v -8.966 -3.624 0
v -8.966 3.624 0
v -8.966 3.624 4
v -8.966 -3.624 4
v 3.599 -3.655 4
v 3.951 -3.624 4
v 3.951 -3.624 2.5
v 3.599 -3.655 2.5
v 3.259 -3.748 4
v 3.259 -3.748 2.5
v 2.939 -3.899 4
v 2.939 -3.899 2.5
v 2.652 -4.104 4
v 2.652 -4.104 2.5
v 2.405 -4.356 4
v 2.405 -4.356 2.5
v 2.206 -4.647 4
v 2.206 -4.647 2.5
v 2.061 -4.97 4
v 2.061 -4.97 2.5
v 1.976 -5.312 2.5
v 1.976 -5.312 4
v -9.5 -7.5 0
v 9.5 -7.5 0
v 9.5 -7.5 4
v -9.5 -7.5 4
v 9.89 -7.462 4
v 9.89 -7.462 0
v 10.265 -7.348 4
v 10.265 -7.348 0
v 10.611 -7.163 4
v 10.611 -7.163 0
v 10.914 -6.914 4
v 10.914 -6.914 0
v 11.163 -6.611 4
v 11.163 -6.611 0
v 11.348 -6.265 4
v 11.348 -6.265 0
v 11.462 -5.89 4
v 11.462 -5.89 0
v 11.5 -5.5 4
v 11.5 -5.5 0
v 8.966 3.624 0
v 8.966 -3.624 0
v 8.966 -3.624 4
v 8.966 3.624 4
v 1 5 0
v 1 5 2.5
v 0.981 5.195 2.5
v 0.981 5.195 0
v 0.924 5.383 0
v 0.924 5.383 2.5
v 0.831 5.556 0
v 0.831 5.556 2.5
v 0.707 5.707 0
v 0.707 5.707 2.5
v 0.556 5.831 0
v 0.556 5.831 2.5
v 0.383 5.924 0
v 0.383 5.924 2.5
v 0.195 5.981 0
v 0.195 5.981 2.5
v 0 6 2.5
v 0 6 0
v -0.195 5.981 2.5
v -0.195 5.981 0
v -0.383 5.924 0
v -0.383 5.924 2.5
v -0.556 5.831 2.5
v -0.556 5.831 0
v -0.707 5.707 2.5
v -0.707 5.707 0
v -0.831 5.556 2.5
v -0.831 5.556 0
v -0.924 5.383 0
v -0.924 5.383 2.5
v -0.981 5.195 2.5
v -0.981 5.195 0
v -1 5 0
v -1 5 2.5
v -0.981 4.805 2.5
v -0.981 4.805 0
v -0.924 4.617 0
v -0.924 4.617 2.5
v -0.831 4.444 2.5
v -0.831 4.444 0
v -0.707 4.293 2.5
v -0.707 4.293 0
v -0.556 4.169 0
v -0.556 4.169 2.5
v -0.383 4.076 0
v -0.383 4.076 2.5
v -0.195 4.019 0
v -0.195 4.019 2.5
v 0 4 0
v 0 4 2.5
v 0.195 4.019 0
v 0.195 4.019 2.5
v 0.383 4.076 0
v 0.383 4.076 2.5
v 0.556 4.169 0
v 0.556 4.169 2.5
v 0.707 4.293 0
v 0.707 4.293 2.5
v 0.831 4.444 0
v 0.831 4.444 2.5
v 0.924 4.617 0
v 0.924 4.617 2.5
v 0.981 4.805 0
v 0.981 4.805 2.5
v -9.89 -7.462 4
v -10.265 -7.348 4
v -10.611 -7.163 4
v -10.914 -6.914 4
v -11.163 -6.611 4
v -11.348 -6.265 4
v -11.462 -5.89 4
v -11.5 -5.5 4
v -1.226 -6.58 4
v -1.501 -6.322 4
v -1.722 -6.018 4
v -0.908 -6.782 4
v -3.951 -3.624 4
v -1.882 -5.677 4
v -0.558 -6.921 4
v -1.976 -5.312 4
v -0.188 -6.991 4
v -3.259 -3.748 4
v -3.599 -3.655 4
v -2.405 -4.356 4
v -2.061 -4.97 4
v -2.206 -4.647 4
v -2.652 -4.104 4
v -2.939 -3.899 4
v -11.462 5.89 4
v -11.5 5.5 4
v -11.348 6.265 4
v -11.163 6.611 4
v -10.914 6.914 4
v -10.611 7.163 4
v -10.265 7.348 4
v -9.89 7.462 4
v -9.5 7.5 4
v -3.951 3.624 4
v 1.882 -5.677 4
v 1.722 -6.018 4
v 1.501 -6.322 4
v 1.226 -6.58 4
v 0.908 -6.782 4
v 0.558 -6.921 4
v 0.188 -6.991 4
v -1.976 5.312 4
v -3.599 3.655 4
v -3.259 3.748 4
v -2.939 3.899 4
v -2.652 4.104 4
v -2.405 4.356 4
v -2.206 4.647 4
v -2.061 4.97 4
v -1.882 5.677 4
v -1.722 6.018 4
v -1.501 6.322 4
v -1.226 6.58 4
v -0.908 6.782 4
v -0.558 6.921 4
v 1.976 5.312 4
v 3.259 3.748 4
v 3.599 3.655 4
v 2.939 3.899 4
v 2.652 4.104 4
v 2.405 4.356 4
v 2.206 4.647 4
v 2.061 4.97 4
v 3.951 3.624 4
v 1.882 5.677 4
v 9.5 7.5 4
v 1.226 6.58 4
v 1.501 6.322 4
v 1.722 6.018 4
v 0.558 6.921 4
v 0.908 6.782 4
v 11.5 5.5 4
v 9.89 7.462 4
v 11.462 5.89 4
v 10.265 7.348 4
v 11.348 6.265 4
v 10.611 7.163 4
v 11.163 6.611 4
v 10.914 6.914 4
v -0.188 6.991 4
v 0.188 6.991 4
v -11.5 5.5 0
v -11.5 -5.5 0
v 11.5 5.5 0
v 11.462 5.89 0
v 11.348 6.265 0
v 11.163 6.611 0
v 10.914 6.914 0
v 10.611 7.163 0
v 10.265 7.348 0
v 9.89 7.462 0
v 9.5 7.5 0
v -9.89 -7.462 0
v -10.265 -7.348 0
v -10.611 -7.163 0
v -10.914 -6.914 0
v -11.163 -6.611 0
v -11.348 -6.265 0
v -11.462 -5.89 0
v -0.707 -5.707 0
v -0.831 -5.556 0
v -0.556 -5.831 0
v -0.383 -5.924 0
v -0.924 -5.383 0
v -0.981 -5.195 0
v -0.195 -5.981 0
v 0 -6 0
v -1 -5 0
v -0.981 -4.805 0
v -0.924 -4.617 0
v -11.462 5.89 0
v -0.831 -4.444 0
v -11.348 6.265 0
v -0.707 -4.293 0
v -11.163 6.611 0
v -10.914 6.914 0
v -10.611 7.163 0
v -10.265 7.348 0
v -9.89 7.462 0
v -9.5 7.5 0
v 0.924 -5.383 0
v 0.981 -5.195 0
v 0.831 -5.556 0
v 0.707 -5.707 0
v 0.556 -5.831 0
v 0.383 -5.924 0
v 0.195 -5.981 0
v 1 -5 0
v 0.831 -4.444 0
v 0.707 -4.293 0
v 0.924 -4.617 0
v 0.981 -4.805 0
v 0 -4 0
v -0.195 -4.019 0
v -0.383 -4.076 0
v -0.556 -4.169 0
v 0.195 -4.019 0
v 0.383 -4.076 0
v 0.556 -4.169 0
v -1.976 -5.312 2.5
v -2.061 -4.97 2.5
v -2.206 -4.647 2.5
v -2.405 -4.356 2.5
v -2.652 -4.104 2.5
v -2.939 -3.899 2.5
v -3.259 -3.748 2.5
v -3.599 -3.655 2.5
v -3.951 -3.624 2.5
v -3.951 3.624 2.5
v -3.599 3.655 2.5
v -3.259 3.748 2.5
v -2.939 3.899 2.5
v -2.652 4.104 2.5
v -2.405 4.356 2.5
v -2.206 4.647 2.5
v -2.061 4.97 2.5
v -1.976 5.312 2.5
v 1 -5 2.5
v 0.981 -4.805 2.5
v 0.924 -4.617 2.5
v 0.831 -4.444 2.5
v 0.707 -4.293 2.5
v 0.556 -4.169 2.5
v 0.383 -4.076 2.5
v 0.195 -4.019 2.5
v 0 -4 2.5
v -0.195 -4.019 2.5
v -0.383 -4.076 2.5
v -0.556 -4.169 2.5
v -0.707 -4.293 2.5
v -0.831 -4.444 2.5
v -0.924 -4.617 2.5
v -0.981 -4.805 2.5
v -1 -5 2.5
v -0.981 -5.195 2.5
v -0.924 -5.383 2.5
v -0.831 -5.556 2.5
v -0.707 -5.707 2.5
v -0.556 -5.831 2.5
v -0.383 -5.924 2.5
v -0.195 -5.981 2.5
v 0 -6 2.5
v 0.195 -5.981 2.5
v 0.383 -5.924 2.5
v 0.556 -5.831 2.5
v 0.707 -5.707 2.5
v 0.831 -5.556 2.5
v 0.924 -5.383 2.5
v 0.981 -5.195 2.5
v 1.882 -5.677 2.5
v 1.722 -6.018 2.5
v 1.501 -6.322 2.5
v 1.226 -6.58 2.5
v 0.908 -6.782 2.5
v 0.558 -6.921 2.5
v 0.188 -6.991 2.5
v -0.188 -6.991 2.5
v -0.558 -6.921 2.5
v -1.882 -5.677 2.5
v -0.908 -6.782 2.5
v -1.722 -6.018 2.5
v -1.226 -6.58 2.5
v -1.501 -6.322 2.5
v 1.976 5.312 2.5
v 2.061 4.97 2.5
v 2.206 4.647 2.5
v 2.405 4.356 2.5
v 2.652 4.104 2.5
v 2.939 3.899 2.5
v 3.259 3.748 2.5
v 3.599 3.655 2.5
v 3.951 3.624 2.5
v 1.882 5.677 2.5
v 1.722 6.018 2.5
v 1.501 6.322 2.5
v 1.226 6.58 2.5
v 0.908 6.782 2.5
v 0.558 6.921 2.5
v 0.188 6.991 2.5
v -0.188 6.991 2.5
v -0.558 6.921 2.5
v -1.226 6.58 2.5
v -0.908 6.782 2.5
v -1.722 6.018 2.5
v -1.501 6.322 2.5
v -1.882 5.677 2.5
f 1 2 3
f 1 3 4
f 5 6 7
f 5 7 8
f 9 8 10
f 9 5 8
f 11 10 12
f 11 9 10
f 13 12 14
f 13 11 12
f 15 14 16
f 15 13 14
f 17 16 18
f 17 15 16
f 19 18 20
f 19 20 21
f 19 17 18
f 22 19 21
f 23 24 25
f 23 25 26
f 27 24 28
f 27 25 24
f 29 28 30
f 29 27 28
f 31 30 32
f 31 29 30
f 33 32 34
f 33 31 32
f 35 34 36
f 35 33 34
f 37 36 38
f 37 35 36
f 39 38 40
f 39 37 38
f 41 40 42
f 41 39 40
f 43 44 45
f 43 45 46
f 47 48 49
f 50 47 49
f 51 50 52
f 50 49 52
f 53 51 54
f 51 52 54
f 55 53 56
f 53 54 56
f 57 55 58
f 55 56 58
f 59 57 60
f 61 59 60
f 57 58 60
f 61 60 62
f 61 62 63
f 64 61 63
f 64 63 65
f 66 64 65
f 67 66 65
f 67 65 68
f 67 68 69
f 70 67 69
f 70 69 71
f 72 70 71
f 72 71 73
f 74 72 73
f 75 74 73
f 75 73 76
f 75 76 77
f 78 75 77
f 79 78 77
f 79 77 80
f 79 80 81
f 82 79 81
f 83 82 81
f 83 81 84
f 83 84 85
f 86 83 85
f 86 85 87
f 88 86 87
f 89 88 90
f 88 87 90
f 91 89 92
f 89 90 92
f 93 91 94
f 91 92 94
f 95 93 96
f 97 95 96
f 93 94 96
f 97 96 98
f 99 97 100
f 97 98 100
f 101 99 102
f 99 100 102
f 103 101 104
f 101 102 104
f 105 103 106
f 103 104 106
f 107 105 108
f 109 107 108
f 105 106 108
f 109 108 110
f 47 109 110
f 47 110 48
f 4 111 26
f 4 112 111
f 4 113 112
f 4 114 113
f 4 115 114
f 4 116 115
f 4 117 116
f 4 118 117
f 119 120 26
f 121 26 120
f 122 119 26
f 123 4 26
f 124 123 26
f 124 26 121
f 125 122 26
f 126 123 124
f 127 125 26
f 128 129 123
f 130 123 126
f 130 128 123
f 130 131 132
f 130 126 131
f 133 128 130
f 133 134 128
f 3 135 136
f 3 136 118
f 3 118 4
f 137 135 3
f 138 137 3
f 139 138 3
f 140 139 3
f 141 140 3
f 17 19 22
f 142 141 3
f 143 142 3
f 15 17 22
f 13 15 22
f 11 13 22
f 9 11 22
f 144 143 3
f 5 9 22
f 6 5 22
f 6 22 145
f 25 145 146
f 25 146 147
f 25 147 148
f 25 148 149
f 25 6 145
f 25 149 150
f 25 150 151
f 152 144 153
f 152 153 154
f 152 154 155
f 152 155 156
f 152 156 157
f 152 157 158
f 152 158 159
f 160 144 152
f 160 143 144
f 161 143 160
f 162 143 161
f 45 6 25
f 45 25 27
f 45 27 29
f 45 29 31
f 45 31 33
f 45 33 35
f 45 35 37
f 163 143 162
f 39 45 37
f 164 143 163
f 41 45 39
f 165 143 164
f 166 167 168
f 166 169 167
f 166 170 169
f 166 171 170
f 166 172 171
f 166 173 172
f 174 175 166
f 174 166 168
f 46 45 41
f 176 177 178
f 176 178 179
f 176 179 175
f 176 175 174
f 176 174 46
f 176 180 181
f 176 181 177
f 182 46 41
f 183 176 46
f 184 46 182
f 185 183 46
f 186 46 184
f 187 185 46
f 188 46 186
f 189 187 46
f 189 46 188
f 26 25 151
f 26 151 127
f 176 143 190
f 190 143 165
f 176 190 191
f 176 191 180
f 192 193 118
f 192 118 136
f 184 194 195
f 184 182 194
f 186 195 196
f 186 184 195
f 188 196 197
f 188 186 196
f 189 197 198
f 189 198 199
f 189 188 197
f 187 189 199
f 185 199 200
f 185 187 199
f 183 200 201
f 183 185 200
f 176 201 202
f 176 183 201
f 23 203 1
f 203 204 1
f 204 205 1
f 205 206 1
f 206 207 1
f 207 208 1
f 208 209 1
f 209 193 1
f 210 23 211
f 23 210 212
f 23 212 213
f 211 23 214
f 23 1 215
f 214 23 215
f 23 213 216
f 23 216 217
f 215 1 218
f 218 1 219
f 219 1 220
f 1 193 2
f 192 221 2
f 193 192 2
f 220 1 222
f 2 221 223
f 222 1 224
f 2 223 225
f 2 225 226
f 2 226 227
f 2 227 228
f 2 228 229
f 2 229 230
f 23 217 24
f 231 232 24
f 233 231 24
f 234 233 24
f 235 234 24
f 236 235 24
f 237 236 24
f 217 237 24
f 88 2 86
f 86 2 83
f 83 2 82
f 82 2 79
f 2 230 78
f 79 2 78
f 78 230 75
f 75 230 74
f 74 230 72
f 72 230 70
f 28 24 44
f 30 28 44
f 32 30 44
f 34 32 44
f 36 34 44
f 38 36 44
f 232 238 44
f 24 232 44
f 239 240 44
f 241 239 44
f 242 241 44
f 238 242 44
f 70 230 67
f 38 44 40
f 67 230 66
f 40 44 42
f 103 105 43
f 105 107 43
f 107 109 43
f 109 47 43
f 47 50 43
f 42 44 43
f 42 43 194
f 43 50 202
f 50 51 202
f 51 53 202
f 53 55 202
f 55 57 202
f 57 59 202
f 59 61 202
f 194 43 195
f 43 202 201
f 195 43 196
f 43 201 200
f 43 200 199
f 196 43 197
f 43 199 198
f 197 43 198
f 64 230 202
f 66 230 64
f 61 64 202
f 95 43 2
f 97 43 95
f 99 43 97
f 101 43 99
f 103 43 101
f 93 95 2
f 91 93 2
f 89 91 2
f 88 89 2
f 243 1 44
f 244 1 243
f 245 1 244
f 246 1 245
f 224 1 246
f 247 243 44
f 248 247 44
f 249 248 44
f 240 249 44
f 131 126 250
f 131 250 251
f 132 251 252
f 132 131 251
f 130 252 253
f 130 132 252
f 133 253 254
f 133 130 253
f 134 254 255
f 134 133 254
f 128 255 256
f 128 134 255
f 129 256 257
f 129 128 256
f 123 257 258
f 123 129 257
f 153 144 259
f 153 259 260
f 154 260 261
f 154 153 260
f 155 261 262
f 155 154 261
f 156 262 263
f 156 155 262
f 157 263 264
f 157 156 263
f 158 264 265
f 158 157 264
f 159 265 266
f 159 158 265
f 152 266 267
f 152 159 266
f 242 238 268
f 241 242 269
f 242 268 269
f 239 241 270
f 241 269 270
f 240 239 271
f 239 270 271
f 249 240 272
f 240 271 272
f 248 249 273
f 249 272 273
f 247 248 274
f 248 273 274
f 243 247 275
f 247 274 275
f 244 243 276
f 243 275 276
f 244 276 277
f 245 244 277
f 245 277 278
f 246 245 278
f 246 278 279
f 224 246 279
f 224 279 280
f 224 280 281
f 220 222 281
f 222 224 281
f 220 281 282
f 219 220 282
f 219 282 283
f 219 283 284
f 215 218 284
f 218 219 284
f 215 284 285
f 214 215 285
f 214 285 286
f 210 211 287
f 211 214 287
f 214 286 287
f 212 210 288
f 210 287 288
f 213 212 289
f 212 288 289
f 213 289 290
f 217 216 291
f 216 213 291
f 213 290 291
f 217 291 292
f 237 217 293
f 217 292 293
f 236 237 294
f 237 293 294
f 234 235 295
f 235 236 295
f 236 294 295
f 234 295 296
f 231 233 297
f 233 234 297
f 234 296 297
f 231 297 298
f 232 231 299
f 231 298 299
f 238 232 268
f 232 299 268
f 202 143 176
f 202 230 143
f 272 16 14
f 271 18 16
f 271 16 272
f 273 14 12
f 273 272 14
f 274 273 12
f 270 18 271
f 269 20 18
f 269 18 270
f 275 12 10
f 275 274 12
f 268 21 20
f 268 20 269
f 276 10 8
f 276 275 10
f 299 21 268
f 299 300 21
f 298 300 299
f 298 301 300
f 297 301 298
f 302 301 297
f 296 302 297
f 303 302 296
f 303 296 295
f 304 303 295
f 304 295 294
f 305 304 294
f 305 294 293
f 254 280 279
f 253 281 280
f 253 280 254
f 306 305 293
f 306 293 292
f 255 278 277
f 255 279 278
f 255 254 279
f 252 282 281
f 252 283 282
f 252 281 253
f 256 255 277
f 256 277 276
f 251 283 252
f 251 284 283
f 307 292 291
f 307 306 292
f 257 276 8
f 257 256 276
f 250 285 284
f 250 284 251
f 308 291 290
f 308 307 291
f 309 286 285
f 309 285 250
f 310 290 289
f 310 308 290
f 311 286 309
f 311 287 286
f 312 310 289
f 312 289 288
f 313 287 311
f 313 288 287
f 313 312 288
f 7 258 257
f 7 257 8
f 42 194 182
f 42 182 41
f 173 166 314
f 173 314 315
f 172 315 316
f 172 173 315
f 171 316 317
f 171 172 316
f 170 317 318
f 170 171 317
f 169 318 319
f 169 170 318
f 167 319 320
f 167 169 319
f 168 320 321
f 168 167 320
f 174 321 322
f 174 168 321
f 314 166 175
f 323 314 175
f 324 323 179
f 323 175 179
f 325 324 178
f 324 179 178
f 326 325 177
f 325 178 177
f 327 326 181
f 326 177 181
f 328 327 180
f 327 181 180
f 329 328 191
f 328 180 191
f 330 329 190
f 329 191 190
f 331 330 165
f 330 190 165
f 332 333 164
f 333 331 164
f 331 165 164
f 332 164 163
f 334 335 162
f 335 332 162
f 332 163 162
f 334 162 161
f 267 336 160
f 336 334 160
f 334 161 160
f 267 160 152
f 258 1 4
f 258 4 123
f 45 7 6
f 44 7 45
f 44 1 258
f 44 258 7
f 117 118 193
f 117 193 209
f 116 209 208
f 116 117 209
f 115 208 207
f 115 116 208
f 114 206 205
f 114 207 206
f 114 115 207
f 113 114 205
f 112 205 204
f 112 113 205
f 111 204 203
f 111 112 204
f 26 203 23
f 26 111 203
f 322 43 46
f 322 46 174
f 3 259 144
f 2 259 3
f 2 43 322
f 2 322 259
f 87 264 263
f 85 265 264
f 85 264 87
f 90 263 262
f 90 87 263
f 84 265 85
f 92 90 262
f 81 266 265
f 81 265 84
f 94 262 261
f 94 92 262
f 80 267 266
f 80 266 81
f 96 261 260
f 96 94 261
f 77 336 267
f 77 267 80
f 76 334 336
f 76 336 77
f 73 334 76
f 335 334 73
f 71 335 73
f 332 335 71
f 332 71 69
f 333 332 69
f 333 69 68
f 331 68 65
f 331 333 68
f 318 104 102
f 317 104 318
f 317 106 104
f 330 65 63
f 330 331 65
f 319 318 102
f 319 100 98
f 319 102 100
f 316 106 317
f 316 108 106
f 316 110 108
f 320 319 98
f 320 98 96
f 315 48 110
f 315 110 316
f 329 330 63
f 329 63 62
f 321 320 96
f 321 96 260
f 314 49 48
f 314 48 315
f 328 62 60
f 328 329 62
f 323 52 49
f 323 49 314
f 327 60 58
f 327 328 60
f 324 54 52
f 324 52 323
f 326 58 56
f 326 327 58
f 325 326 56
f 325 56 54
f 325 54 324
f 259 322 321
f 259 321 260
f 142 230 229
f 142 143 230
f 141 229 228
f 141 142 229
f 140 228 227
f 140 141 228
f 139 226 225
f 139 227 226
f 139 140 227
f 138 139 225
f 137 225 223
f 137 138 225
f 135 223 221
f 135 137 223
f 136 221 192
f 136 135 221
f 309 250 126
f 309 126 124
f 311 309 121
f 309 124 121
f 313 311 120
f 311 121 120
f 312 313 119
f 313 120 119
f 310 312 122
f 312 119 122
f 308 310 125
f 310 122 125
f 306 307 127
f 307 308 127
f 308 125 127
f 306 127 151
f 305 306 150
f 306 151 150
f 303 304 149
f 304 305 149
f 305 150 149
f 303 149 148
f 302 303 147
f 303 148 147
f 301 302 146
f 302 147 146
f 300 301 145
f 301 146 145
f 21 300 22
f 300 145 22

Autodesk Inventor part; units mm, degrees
ref_plane "YZ Plane" through (0, 0, 0) normal (1, 0, 0) x (0, 1, 0)
ref_plane "XZ Plane" through (0, 0, 0) normal (0, 1, 0) x (-1, 0, 0)
ref_plane "XY Plane" through (0, 0, 0) normal (0, 0, 1) x (1, 0, 0)
sketch "草图1" plane through (0, 0, 0) normal (0, 0, 1) x (1, 0, 0)
  line L0 (11.5, -7.5) -> (-11.5, -7.5)
  line L1 (-11.5, -7.5) -> (-11.5, 7.5)
  line L2 (-11.5, 7.5) -> (11.5, 7.5)
  line L3 (11.5, 7.5) -> (11.5, -7.5)
  line L4 (11.5, -7.5) -> (-11.5, 7.5) construction
  line L5 (-11.5, -7.5) -> (11.5, 7.5) construction
  point P0 (0, 0)
  dimension "d0" = 23
  dimension "d1" = 15
extrude "拉伸1" add sketch "草图1" along normal blind 4
sketch "草图2" plane through (0, 0, 4) normal (0, 0, 1) x (1, 0, 0)
  circle A0 centre (0, 5) radius 1
  point P0 (0, 0)
  dimension "d4" = 2
  dimension "d10" = 5
extrude "拉伸2" cut sketch "草图2" against normal blind 4
sketch "草图3" plane through (0, 0, 0) normal (0, 0, -1) x (-1, 0, 0)
  line L0 (8.9655, -3.6241) -> (-8.9655, -3.6241)
  line L1 (-8.9655, -3.6241) -> (-8.9655, 3.6241)
  line L2 (-8.9655, 3.6241) -> (8.9655, 3.6241)
  line L3 (8.9655, 3.6241) -> (8.9655, -3.6241)
  line L4 (8.9655, -3.6241) -> (-8.9655, 3.6241) construction
  line L5 (-8.9655, -3.6241) -> (8.9655, 3.6241) construction
  point P0 (0, 0)
extrude "拉伸3" cut sketch "草图3" against normal blind 4
fillet "圆角1" radius 2 4 edges at (11.5, 7.5, 2) (-11.5, 7.5, 2) (-11.5, -7.5, 2) (11.5, -7.5, 2)
sketch "草图4" plane through (0, 0, 4) normal (0, 0, 1) x (1, 0, 0)
  circle A0 centre (0, 5) radius 1 projected
  circle A1 centre (0, 5) radius 2
  point P0 (0, 0)
  dimension "d11" = 4
extrude "拉伸4" cut sketch "草图4" against normal blind 1.5 contours A0 | A1
fillet "圆角2" radius 2 2 edges at (1.4515, 3.6241, 3.25) (-1.4515, 3.6241, 3.25)
mirror "镜像1" about plane through (0, 0, 0) normal (0, 1, 0) of "拉伸4", "圆角2", "拉伸2"
properties part number "4mm隔热板"
